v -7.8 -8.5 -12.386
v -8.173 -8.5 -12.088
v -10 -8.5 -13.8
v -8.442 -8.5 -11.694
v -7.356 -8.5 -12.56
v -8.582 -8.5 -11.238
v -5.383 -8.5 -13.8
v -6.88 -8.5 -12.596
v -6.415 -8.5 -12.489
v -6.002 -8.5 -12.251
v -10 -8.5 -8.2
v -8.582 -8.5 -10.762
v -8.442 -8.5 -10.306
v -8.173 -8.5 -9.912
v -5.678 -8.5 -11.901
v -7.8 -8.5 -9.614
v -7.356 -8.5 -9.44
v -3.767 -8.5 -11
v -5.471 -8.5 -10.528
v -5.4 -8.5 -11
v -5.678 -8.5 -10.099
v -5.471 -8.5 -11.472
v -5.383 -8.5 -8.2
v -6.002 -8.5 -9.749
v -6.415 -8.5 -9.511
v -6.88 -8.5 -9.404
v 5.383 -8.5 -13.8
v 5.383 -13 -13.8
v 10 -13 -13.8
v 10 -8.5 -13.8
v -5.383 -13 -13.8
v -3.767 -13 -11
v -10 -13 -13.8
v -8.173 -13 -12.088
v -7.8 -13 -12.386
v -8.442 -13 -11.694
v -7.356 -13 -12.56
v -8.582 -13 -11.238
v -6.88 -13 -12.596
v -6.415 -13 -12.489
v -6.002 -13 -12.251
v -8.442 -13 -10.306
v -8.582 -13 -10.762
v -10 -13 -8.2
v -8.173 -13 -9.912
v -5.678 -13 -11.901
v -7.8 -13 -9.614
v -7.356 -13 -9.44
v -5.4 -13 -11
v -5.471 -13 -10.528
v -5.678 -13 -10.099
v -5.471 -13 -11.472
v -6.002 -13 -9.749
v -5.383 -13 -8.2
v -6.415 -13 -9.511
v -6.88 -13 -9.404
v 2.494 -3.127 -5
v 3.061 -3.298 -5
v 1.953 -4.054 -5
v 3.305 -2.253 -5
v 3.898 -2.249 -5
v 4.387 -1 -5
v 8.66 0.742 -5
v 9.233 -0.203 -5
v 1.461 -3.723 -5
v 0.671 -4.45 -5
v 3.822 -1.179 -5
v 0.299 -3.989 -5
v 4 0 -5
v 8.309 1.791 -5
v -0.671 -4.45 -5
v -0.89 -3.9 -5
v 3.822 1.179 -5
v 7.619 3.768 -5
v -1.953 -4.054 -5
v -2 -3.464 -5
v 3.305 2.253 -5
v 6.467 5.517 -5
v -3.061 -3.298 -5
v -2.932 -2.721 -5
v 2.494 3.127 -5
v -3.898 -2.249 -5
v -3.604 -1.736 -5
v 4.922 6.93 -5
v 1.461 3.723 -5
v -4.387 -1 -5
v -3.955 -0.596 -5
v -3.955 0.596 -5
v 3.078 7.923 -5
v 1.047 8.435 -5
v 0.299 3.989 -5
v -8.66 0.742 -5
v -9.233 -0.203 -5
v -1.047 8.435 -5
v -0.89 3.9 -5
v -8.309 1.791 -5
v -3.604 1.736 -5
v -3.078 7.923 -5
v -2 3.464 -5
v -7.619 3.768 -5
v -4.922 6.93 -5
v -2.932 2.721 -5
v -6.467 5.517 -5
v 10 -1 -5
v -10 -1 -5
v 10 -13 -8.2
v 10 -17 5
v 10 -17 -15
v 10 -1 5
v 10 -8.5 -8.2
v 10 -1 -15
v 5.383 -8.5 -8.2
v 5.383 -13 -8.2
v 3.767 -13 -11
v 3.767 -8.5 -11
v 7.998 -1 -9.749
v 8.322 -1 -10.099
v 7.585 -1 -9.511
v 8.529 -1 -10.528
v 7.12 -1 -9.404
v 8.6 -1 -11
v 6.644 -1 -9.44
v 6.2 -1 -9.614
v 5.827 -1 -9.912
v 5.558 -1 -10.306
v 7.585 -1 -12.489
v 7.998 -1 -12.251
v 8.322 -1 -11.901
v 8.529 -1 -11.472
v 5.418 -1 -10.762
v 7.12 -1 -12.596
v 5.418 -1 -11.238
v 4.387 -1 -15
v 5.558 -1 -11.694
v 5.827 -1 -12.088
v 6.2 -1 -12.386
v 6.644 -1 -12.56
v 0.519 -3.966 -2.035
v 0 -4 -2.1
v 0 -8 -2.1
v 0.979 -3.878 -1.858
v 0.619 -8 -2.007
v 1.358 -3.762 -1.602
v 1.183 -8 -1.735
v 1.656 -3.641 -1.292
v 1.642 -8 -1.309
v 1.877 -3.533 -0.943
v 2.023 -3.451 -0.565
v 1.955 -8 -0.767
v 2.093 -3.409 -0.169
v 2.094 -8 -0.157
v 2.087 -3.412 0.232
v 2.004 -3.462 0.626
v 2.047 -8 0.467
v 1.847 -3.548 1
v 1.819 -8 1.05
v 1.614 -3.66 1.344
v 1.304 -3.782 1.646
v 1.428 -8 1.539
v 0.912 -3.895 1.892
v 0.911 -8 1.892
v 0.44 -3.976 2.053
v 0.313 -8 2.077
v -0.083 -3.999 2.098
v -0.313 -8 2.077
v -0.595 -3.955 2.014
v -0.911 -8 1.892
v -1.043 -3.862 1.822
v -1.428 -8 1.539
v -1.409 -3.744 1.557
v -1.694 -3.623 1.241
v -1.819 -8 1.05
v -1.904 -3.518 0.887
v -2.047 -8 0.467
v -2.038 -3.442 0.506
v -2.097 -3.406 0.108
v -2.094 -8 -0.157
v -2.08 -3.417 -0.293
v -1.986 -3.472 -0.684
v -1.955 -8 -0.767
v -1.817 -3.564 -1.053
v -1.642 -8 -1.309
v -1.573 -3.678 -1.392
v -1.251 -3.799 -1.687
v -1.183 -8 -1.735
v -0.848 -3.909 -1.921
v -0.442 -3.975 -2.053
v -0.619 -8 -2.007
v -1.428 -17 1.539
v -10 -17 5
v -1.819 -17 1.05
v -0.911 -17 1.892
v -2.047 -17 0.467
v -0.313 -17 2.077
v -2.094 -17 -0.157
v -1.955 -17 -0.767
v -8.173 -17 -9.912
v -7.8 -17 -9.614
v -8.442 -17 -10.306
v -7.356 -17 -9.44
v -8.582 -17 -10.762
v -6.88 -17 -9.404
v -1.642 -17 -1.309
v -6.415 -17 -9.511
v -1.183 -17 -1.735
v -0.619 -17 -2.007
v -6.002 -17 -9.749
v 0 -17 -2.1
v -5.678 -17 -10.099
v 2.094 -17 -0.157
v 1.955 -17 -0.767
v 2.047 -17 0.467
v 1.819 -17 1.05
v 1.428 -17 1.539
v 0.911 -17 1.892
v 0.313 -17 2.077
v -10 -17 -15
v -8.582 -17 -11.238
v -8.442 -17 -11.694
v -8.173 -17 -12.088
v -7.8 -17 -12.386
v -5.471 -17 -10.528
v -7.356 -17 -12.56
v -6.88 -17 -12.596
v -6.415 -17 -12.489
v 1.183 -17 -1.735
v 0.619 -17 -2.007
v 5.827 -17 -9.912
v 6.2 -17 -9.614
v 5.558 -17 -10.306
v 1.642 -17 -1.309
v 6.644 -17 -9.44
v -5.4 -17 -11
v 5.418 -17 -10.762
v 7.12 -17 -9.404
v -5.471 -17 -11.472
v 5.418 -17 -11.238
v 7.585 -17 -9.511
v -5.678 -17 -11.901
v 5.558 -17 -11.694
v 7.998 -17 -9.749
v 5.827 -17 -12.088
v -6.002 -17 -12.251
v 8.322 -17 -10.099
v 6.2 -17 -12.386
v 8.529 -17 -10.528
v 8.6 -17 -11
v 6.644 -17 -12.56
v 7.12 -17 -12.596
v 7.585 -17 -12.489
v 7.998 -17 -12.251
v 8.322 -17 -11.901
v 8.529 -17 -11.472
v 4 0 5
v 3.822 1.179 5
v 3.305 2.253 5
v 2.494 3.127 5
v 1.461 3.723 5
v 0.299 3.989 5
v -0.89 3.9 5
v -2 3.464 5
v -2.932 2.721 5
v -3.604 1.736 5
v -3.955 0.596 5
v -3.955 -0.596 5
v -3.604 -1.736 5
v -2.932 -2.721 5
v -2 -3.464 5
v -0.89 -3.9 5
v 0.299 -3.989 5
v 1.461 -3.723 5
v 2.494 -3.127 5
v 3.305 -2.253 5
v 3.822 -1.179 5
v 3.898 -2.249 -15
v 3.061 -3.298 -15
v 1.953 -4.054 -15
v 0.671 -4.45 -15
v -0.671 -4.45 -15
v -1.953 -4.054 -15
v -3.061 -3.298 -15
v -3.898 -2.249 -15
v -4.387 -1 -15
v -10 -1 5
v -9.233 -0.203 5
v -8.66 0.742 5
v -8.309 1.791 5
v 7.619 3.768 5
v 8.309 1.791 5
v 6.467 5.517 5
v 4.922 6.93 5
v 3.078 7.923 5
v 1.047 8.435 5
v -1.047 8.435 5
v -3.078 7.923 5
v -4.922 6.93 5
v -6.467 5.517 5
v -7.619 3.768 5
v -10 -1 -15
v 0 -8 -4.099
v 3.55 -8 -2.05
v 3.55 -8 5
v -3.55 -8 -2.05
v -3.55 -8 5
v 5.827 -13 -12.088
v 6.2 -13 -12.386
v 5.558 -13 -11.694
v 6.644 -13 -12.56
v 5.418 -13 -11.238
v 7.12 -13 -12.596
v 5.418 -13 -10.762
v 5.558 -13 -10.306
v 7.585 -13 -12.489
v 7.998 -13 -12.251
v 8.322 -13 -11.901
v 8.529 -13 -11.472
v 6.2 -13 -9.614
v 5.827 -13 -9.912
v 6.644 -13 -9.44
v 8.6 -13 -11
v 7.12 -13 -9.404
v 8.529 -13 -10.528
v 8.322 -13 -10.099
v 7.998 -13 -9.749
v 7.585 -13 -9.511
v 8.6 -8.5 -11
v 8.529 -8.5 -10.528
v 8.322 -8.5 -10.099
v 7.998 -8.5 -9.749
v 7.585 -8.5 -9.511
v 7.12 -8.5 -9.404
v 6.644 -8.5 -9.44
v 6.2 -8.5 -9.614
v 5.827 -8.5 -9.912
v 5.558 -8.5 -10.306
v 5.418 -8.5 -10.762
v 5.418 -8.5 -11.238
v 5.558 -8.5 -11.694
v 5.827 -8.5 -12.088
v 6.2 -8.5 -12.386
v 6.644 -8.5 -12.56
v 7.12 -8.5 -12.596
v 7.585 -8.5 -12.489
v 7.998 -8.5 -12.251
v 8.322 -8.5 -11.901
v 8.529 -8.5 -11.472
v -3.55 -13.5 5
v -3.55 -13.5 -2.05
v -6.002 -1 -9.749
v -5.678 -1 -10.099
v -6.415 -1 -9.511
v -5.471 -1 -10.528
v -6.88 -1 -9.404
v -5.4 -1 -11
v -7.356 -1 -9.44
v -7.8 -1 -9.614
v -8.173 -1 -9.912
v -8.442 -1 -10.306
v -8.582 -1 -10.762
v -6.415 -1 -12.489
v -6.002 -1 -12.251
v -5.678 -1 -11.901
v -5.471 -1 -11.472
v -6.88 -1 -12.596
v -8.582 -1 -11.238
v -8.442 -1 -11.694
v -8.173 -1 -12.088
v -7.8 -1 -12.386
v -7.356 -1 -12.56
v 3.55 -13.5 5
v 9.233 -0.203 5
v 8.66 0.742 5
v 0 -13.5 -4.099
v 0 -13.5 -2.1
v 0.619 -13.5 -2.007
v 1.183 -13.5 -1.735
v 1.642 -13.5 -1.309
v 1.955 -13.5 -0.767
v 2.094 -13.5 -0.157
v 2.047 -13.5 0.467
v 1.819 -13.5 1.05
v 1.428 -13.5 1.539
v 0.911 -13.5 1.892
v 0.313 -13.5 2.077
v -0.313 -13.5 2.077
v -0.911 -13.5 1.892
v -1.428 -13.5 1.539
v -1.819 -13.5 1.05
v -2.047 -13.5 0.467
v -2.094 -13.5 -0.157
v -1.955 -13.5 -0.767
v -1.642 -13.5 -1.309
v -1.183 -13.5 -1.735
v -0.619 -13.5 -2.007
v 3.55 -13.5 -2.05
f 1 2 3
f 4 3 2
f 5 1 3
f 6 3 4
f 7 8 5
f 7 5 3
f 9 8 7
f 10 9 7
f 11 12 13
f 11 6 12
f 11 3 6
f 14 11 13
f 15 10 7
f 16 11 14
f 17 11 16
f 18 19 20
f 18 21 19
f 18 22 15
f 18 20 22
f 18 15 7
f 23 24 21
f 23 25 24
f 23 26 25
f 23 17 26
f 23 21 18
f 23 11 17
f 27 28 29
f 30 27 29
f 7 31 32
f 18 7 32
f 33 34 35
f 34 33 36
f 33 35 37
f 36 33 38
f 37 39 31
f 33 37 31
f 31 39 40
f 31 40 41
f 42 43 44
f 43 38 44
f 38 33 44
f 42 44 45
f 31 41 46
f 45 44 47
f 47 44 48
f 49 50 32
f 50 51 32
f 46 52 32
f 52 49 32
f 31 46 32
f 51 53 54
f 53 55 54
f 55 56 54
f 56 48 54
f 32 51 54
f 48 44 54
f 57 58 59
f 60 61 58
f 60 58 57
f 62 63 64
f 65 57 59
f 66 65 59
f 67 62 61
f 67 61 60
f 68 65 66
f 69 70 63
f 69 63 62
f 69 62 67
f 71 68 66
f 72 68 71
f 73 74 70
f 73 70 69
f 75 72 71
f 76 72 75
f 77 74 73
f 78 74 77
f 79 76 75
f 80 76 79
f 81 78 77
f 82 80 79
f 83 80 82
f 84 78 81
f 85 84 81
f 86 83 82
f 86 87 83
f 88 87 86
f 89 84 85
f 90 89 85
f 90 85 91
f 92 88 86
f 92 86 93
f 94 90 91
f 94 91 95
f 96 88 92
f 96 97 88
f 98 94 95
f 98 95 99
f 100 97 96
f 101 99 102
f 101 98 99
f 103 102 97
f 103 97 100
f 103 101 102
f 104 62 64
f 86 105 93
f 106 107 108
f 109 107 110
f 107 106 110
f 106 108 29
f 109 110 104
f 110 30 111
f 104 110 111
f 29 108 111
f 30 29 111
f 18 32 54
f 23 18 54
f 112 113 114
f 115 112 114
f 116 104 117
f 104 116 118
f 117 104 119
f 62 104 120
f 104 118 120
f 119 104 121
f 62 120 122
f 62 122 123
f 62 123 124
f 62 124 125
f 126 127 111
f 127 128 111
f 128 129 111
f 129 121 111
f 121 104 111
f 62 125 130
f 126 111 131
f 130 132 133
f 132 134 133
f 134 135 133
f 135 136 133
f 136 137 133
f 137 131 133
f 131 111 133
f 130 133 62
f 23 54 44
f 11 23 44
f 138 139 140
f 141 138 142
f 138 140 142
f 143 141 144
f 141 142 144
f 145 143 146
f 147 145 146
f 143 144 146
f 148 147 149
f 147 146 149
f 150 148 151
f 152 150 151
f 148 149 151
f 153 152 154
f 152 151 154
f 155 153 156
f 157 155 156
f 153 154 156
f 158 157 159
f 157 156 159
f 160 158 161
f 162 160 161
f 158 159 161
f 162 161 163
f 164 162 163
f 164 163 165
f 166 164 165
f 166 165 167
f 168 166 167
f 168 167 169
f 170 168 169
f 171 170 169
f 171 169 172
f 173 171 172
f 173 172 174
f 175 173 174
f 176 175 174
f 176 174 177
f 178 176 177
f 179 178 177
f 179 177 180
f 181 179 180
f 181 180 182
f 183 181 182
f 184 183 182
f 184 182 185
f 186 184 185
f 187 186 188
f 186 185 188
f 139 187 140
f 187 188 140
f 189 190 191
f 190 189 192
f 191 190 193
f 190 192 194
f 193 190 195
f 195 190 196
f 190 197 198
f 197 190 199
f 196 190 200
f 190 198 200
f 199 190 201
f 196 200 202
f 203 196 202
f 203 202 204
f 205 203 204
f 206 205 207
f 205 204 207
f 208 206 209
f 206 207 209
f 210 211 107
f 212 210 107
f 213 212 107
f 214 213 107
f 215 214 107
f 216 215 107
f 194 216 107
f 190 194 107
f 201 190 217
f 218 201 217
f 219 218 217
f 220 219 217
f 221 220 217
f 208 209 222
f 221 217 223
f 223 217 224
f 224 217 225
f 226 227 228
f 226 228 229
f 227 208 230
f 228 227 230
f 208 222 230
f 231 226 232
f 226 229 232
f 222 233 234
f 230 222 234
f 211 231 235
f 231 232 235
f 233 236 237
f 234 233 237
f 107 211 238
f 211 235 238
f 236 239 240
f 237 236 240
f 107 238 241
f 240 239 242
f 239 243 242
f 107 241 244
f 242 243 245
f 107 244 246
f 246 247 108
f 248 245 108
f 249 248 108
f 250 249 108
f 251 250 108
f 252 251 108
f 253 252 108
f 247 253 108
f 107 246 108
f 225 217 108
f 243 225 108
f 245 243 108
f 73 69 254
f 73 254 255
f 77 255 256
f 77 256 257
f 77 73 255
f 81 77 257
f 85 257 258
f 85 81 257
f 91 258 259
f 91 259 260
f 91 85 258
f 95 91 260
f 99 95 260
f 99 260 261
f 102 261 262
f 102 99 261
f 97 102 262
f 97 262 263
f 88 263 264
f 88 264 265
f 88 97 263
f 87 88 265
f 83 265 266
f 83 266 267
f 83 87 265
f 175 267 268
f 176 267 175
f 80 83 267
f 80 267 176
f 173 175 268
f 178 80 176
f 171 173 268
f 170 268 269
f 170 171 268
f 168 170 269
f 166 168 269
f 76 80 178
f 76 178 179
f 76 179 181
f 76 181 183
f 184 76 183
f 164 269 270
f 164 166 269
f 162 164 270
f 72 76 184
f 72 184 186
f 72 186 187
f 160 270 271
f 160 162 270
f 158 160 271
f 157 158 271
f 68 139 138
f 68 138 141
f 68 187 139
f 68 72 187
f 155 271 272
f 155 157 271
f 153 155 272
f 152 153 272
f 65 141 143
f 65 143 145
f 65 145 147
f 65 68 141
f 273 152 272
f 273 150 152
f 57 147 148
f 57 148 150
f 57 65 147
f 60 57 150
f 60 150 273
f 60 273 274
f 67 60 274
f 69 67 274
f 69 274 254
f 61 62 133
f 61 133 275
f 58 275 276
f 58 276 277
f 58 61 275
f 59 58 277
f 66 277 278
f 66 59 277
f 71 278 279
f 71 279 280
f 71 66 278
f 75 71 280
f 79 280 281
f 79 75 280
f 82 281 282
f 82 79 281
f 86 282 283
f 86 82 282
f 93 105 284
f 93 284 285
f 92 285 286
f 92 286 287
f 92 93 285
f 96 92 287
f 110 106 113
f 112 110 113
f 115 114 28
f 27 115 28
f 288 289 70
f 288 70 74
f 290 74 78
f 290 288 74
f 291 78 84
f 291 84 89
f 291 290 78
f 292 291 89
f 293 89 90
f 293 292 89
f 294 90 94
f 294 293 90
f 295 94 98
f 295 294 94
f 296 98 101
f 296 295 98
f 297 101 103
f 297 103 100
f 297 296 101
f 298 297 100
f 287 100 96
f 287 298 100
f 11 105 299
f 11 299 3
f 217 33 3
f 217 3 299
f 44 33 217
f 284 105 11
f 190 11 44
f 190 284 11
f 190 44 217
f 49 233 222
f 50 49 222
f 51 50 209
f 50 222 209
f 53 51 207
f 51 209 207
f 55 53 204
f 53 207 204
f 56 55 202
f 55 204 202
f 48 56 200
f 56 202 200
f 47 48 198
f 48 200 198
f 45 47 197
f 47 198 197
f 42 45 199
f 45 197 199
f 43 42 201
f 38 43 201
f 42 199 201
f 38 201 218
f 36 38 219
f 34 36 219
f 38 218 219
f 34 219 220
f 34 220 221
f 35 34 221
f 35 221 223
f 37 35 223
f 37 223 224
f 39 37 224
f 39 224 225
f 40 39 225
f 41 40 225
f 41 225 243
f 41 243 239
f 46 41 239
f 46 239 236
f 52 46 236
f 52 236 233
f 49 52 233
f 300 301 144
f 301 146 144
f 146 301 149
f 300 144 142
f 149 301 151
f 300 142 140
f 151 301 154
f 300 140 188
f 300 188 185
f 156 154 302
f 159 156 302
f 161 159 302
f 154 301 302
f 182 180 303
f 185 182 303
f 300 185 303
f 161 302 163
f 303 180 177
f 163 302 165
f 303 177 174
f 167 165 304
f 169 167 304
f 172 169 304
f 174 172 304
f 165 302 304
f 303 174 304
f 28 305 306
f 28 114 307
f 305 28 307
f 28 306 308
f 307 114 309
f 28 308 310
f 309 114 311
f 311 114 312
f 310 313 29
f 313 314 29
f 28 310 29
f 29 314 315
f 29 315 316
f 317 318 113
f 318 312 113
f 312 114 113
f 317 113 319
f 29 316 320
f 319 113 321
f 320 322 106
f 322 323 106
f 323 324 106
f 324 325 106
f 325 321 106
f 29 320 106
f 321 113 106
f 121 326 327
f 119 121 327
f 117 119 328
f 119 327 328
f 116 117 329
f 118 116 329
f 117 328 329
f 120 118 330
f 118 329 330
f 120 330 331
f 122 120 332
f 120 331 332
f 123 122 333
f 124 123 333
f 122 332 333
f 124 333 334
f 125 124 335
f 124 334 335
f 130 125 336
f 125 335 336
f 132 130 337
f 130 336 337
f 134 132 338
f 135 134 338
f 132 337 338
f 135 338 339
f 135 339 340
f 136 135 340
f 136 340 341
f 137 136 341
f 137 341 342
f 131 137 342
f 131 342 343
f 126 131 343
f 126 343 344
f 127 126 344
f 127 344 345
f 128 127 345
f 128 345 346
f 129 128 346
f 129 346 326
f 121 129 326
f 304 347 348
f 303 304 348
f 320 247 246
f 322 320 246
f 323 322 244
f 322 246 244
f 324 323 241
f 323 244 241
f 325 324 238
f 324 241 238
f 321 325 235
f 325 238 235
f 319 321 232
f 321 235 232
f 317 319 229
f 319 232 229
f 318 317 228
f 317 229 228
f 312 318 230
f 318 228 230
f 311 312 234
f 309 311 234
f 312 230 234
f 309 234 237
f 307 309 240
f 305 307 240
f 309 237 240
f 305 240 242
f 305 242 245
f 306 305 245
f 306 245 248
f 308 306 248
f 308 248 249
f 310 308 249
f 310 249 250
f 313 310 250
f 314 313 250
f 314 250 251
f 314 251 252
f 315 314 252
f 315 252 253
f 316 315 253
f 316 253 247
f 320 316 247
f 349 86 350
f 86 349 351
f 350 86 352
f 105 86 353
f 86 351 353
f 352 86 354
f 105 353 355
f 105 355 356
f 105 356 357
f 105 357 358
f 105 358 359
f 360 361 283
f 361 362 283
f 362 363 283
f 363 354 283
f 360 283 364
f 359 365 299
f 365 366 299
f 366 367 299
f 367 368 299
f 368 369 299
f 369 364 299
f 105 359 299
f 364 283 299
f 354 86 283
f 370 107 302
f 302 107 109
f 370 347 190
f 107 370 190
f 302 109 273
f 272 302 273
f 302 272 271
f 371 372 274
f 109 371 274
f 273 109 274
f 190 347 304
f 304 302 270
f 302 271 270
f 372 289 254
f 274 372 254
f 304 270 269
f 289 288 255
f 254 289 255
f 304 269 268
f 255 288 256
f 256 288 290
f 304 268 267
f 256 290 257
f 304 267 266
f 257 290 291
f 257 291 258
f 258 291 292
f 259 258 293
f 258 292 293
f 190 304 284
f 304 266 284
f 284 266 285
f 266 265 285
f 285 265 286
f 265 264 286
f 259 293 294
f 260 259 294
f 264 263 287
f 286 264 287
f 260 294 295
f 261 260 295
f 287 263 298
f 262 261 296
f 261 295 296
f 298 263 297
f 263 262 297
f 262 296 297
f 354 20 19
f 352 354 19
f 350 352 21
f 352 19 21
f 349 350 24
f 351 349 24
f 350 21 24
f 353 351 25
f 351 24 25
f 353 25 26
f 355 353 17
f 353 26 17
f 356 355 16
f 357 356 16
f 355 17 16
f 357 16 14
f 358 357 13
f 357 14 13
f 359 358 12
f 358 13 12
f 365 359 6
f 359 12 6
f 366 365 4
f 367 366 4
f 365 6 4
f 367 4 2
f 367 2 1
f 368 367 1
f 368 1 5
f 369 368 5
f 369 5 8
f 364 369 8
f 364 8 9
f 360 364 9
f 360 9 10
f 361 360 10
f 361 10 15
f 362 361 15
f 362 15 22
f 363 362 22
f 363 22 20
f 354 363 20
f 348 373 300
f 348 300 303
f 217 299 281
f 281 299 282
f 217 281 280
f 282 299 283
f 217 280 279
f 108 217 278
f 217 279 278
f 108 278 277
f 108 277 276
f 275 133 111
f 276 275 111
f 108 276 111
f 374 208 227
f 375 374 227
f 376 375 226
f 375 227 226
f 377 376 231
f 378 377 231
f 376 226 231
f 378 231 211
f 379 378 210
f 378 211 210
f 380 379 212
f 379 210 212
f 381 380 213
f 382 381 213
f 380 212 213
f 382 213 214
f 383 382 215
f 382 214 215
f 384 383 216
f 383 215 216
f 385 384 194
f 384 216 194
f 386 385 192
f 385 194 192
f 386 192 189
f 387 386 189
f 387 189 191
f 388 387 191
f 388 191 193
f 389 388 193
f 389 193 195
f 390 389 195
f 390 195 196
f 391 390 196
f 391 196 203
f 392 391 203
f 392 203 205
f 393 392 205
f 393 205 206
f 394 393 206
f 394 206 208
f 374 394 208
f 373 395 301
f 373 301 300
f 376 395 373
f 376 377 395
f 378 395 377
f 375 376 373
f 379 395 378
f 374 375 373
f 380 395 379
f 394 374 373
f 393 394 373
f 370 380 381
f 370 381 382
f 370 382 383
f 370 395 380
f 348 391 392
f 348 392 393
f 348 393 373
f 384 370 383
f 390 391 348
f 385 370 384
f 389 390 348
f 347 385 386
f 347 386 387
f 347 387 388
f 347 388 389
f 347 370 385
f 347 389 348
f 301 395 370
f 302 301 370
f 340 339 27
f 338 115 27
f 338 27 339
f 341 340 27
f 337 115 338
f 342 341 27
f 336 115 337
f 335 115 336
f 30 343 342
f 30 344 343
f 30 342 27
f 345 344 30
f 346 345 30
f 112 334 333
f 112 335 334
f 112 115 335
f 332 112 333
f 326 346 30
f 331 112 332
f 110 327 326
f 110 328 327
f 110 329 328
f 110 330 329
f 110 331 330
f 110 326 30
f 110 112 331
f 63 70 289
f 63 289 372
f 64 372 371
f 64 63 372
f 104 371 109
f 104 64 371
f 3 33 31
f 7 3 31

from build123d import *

# Parameters (mm, degrees)
SKETCH1_R                       = 4
BOSS_EXTRUDE1_DEPTH             = 5
BOSS_EXTRUDE2_DEPTH             = 10
BOSS_EXTRUDE2_DIRECTION_2_REACH = 23.477
CUT_EXTRUDE1_REACH              = 33.229
CUT_EXTRUDE1_END_RADIUS         = 4
SKETCH2_R                       = 2.1
CUT_EXTRUDE2_START              = -3.5
CUT_EXTRUDE2_DEPTH              = 5.5
FILLET1_R                       = 5
SKETCH5_R                       = 1.6
CUT_EXTRUDE3_DEPTH              = 32.228992939
CUT_EXTRUDE4_START              = -4
CUT_EXTRUDE4_DEPTH              = 4.5


with BuildPart() as part:
    # Sketch1 → Boss-Extrude1 (new, symmetric)
    with BuildSketch(Plane.XY):
        with BuildLine():
            Line((-8, -2.872281323), (-8, -17))
            Line((-8, -17), (8, -17))
            Line((8, -17), (8, -2.872281323))
            ThreePointArc((8, -2.872281323), (0, 8.5), (-8, -2.872281323))
        make_face()
        Circle(SKETCH1_R, mode=Mode.SUBTRACT)
    extrude(amount=BOSS_EXTRUDE1_DEPTH, both=True)

    # Sketch4 → Boss-Extrude2 (add)
    with BuildSketch(Plane(origin=(0, 0, -5), x_dir=(-1, 0, 0), z_dir=(0, 0, -1))):
        with BuildLine():
            Line((-10, -1), (-4.387482194, -1))
            ThreePointArc((-4.387482194, -1), (0, -4.5), (4.387482194, -1))
            Line((4.387482194, -1), (10, -1))
            Line((10, -1), (10, -17))
            Line((10, -17), (-10, -17))
            Line((-10, -17), (-10, -1))
        make_face()
    extrude(amount=BOSS_EXTRUDE2_DEPTH)

    # Boss-Extrude2 direction 2: up to this face of the body (flat: up to its plane)
    boss_extrude2_direction_2_end = Plane(part.part.faces().sort_by_distance((0, -5.649299223, 5))[0])
    # Sketch4 → Boss-Extrude2 direction 2 (add, up to the picked face)
    with BuildSketch(Plane(origin=(0, 0, -5), x_dir=(-1, 0, 0), z_dir=(0, 0, -1)), mode=Mode.PRIVATE) as boss_extrude2_direction_2_sk1:
        with BuildLine():
            Line((-10, -1), (-4.387482194, -1))
            ThreePointArc((-4.387482194, -1), (0, -4.5), (4.387482194, -1))
            Line((4.387482194, -1), (10, -1))
            Line((10, -1), (10, -17))
            Line((10, -17), (-10, -17))
            Line((-10, -17), (-10, -1))
        make_face()
    boss_extrude2_direction_2_tool1 = split(extrude(boss_extrude2_direction_2_sk1.sketch, amount=-BOSS_EXTRUDE2_DIRECTION_2_REACH, mode=Mode.PRIVATE), bisect_by=boss_extrude2_direction_2_end, keep=Keep.BOTH, mode=Mode.PRIVATE)
    add(boss_extrude2_direction_2_tool1.solids().sort_by(Axis((0, -9.503652, -5), (0, 0, 1)))[0])

    # Cut-Extrude1: up to this cylinder (the profile starts outside it)
    cut_extrude1_end = Plane(origin=(0, 0, 0), z_dir=(0, 0, -1)) * Cylinder(CUT_EXTRUDE1_END_RADIUS, 75.458, mode=Mode.PRIVATE)
    # Sketch2 → Cut-Extrude1 (cut, up to the surface)
    with BuildSketch(Plane.XZ.offset(17), mode=Mode.PRIVATE) as cut_extrude1_sk1:
        with Locations(Location((0, 0, 0), (0, 0, 270))):
            Circle(SKETCH2_R)
    cut_extrude1_tool1 = extrude(cut_extrude1_sk1.sketch, amount=-CUT_EXTRUDE1_REACH, mode=Mode.PRIVATE) - cut_extrude1_end
    add(cut_extrude1_tool1.solids().sort_by_distance((0, -17, 0))[0], mode=Mode.SUBTRACT)

    # Sketch3 → Cut-Extrude2 (cut)
    with BuildSketch(Plane.XZ.offset(17).offset(CUT_EXTRUDE2_START)):
        Polygon((-3.55, 2.049593456), (-3.55, 5), (3.55, 5), (3.55, 2.049593456), (3.55, -2.049593456), (0, -4.099186911), (-3.55, -2.049593456), align=None)
    extrude(amount=-CUT_EXTRUDE2_DEPTH, mode=Mode.SUBTRACT)

    # Fillet1
    # the kernel refuses this fillet: 5 mm, written as the material it adds along each edge
    with BuildSketch(Plane(origin=(-8.440971508, -1, -5), x_dir=(-1, 0, 0), z_dir=(0, 0, 1))) as fillet1_piece_1:
        with BuildLine():
            CenterArc((4.755970452, -3.844419605), FILLET1_R, 129.746228544, 38.09052624)
            Line((-0.131785829, -2.790930863), (-0.229540955, -2.769861088))
            ThreePointArc((-0.229540955, -2.769861088), (-0.050320463, -1.396200752), (-0.099305547, -0.011764706))
            Line((-0.099305547, -0.011764706), (0, 0.1))
            ThreePointArc((0, 0.1), (0.779514246, 0.1), (1.495089653, 0.076888392))
            Line((1.495089653, 0.076888392), (1.559028492, 0))
        make_face()
    extrude(amount=10)
    with BuildSketch(Plane(origin=(8.440971508, -1, -5), x_dir=(1, 0, 0), z_dir=(0, 0, 1))) as fillet1_piece_2:
        with BuildLine():
            CenterArc((4.755970452, 3.844419605), FILLET1_R, 192.163245216, 38.09052624)
            Line((-0.131785829, 2.790930863), (-0.229540955, 2.769861088))
            ThreePointArc((-0.229540955, 2.769861088), (-0.050320463, 1.396200752), (-0.099305547, 0.011764706))
            Line((-0.099305547, 0.011764706), (0, -0.1))
            ThreePointArc((0, -0.1), (0.779514246, -0.1), (1.495089653, -0.076888392))
            Line((1.495089653, -0.076888392), (1.559028492, 0))
        make_face()
    extrude(amount=10)

    # Sketch5 → Cut-Extrude3 (cut, through all)
    with BuildSketch(Plane.XZ.offset(17)):
        with Locations((7, -11)):
            Circle(SKETCH5_R)
        with Locations((-7, -11)):
            Circle(SKETCH5_R)
    extrude(amount=-CUT_EXTRUDE3_DEPTH, mode=Mode.SUBTRACT)

    # Sketch6 → Cut-Extrude4 (cut)
    with BuildSketch(Plane.XZ.offset(17).offset(CUT_EXTRUDE4_START)):
        Polygon((-8.616580754, -8.2), (-10, -8.2), (-10, -13.8), (-8.616580754, -13.8), (-5.383419246, -13.8), (-3.766838493, -11), (-5.383419246, -8.2), align=None)
        Polygon((8.616580754, -8.2), (5.383419246, -8.2), (3.766838493, -11), (5.383419246, -13.8), (8.616580754, -13.8), (10, -13.8), (10, -8.2), align=None)
    extrude(amount=-CUT_EXTRUDE4_DEPTH, mode=Mode.SUBTRACT)


solid = part.part
